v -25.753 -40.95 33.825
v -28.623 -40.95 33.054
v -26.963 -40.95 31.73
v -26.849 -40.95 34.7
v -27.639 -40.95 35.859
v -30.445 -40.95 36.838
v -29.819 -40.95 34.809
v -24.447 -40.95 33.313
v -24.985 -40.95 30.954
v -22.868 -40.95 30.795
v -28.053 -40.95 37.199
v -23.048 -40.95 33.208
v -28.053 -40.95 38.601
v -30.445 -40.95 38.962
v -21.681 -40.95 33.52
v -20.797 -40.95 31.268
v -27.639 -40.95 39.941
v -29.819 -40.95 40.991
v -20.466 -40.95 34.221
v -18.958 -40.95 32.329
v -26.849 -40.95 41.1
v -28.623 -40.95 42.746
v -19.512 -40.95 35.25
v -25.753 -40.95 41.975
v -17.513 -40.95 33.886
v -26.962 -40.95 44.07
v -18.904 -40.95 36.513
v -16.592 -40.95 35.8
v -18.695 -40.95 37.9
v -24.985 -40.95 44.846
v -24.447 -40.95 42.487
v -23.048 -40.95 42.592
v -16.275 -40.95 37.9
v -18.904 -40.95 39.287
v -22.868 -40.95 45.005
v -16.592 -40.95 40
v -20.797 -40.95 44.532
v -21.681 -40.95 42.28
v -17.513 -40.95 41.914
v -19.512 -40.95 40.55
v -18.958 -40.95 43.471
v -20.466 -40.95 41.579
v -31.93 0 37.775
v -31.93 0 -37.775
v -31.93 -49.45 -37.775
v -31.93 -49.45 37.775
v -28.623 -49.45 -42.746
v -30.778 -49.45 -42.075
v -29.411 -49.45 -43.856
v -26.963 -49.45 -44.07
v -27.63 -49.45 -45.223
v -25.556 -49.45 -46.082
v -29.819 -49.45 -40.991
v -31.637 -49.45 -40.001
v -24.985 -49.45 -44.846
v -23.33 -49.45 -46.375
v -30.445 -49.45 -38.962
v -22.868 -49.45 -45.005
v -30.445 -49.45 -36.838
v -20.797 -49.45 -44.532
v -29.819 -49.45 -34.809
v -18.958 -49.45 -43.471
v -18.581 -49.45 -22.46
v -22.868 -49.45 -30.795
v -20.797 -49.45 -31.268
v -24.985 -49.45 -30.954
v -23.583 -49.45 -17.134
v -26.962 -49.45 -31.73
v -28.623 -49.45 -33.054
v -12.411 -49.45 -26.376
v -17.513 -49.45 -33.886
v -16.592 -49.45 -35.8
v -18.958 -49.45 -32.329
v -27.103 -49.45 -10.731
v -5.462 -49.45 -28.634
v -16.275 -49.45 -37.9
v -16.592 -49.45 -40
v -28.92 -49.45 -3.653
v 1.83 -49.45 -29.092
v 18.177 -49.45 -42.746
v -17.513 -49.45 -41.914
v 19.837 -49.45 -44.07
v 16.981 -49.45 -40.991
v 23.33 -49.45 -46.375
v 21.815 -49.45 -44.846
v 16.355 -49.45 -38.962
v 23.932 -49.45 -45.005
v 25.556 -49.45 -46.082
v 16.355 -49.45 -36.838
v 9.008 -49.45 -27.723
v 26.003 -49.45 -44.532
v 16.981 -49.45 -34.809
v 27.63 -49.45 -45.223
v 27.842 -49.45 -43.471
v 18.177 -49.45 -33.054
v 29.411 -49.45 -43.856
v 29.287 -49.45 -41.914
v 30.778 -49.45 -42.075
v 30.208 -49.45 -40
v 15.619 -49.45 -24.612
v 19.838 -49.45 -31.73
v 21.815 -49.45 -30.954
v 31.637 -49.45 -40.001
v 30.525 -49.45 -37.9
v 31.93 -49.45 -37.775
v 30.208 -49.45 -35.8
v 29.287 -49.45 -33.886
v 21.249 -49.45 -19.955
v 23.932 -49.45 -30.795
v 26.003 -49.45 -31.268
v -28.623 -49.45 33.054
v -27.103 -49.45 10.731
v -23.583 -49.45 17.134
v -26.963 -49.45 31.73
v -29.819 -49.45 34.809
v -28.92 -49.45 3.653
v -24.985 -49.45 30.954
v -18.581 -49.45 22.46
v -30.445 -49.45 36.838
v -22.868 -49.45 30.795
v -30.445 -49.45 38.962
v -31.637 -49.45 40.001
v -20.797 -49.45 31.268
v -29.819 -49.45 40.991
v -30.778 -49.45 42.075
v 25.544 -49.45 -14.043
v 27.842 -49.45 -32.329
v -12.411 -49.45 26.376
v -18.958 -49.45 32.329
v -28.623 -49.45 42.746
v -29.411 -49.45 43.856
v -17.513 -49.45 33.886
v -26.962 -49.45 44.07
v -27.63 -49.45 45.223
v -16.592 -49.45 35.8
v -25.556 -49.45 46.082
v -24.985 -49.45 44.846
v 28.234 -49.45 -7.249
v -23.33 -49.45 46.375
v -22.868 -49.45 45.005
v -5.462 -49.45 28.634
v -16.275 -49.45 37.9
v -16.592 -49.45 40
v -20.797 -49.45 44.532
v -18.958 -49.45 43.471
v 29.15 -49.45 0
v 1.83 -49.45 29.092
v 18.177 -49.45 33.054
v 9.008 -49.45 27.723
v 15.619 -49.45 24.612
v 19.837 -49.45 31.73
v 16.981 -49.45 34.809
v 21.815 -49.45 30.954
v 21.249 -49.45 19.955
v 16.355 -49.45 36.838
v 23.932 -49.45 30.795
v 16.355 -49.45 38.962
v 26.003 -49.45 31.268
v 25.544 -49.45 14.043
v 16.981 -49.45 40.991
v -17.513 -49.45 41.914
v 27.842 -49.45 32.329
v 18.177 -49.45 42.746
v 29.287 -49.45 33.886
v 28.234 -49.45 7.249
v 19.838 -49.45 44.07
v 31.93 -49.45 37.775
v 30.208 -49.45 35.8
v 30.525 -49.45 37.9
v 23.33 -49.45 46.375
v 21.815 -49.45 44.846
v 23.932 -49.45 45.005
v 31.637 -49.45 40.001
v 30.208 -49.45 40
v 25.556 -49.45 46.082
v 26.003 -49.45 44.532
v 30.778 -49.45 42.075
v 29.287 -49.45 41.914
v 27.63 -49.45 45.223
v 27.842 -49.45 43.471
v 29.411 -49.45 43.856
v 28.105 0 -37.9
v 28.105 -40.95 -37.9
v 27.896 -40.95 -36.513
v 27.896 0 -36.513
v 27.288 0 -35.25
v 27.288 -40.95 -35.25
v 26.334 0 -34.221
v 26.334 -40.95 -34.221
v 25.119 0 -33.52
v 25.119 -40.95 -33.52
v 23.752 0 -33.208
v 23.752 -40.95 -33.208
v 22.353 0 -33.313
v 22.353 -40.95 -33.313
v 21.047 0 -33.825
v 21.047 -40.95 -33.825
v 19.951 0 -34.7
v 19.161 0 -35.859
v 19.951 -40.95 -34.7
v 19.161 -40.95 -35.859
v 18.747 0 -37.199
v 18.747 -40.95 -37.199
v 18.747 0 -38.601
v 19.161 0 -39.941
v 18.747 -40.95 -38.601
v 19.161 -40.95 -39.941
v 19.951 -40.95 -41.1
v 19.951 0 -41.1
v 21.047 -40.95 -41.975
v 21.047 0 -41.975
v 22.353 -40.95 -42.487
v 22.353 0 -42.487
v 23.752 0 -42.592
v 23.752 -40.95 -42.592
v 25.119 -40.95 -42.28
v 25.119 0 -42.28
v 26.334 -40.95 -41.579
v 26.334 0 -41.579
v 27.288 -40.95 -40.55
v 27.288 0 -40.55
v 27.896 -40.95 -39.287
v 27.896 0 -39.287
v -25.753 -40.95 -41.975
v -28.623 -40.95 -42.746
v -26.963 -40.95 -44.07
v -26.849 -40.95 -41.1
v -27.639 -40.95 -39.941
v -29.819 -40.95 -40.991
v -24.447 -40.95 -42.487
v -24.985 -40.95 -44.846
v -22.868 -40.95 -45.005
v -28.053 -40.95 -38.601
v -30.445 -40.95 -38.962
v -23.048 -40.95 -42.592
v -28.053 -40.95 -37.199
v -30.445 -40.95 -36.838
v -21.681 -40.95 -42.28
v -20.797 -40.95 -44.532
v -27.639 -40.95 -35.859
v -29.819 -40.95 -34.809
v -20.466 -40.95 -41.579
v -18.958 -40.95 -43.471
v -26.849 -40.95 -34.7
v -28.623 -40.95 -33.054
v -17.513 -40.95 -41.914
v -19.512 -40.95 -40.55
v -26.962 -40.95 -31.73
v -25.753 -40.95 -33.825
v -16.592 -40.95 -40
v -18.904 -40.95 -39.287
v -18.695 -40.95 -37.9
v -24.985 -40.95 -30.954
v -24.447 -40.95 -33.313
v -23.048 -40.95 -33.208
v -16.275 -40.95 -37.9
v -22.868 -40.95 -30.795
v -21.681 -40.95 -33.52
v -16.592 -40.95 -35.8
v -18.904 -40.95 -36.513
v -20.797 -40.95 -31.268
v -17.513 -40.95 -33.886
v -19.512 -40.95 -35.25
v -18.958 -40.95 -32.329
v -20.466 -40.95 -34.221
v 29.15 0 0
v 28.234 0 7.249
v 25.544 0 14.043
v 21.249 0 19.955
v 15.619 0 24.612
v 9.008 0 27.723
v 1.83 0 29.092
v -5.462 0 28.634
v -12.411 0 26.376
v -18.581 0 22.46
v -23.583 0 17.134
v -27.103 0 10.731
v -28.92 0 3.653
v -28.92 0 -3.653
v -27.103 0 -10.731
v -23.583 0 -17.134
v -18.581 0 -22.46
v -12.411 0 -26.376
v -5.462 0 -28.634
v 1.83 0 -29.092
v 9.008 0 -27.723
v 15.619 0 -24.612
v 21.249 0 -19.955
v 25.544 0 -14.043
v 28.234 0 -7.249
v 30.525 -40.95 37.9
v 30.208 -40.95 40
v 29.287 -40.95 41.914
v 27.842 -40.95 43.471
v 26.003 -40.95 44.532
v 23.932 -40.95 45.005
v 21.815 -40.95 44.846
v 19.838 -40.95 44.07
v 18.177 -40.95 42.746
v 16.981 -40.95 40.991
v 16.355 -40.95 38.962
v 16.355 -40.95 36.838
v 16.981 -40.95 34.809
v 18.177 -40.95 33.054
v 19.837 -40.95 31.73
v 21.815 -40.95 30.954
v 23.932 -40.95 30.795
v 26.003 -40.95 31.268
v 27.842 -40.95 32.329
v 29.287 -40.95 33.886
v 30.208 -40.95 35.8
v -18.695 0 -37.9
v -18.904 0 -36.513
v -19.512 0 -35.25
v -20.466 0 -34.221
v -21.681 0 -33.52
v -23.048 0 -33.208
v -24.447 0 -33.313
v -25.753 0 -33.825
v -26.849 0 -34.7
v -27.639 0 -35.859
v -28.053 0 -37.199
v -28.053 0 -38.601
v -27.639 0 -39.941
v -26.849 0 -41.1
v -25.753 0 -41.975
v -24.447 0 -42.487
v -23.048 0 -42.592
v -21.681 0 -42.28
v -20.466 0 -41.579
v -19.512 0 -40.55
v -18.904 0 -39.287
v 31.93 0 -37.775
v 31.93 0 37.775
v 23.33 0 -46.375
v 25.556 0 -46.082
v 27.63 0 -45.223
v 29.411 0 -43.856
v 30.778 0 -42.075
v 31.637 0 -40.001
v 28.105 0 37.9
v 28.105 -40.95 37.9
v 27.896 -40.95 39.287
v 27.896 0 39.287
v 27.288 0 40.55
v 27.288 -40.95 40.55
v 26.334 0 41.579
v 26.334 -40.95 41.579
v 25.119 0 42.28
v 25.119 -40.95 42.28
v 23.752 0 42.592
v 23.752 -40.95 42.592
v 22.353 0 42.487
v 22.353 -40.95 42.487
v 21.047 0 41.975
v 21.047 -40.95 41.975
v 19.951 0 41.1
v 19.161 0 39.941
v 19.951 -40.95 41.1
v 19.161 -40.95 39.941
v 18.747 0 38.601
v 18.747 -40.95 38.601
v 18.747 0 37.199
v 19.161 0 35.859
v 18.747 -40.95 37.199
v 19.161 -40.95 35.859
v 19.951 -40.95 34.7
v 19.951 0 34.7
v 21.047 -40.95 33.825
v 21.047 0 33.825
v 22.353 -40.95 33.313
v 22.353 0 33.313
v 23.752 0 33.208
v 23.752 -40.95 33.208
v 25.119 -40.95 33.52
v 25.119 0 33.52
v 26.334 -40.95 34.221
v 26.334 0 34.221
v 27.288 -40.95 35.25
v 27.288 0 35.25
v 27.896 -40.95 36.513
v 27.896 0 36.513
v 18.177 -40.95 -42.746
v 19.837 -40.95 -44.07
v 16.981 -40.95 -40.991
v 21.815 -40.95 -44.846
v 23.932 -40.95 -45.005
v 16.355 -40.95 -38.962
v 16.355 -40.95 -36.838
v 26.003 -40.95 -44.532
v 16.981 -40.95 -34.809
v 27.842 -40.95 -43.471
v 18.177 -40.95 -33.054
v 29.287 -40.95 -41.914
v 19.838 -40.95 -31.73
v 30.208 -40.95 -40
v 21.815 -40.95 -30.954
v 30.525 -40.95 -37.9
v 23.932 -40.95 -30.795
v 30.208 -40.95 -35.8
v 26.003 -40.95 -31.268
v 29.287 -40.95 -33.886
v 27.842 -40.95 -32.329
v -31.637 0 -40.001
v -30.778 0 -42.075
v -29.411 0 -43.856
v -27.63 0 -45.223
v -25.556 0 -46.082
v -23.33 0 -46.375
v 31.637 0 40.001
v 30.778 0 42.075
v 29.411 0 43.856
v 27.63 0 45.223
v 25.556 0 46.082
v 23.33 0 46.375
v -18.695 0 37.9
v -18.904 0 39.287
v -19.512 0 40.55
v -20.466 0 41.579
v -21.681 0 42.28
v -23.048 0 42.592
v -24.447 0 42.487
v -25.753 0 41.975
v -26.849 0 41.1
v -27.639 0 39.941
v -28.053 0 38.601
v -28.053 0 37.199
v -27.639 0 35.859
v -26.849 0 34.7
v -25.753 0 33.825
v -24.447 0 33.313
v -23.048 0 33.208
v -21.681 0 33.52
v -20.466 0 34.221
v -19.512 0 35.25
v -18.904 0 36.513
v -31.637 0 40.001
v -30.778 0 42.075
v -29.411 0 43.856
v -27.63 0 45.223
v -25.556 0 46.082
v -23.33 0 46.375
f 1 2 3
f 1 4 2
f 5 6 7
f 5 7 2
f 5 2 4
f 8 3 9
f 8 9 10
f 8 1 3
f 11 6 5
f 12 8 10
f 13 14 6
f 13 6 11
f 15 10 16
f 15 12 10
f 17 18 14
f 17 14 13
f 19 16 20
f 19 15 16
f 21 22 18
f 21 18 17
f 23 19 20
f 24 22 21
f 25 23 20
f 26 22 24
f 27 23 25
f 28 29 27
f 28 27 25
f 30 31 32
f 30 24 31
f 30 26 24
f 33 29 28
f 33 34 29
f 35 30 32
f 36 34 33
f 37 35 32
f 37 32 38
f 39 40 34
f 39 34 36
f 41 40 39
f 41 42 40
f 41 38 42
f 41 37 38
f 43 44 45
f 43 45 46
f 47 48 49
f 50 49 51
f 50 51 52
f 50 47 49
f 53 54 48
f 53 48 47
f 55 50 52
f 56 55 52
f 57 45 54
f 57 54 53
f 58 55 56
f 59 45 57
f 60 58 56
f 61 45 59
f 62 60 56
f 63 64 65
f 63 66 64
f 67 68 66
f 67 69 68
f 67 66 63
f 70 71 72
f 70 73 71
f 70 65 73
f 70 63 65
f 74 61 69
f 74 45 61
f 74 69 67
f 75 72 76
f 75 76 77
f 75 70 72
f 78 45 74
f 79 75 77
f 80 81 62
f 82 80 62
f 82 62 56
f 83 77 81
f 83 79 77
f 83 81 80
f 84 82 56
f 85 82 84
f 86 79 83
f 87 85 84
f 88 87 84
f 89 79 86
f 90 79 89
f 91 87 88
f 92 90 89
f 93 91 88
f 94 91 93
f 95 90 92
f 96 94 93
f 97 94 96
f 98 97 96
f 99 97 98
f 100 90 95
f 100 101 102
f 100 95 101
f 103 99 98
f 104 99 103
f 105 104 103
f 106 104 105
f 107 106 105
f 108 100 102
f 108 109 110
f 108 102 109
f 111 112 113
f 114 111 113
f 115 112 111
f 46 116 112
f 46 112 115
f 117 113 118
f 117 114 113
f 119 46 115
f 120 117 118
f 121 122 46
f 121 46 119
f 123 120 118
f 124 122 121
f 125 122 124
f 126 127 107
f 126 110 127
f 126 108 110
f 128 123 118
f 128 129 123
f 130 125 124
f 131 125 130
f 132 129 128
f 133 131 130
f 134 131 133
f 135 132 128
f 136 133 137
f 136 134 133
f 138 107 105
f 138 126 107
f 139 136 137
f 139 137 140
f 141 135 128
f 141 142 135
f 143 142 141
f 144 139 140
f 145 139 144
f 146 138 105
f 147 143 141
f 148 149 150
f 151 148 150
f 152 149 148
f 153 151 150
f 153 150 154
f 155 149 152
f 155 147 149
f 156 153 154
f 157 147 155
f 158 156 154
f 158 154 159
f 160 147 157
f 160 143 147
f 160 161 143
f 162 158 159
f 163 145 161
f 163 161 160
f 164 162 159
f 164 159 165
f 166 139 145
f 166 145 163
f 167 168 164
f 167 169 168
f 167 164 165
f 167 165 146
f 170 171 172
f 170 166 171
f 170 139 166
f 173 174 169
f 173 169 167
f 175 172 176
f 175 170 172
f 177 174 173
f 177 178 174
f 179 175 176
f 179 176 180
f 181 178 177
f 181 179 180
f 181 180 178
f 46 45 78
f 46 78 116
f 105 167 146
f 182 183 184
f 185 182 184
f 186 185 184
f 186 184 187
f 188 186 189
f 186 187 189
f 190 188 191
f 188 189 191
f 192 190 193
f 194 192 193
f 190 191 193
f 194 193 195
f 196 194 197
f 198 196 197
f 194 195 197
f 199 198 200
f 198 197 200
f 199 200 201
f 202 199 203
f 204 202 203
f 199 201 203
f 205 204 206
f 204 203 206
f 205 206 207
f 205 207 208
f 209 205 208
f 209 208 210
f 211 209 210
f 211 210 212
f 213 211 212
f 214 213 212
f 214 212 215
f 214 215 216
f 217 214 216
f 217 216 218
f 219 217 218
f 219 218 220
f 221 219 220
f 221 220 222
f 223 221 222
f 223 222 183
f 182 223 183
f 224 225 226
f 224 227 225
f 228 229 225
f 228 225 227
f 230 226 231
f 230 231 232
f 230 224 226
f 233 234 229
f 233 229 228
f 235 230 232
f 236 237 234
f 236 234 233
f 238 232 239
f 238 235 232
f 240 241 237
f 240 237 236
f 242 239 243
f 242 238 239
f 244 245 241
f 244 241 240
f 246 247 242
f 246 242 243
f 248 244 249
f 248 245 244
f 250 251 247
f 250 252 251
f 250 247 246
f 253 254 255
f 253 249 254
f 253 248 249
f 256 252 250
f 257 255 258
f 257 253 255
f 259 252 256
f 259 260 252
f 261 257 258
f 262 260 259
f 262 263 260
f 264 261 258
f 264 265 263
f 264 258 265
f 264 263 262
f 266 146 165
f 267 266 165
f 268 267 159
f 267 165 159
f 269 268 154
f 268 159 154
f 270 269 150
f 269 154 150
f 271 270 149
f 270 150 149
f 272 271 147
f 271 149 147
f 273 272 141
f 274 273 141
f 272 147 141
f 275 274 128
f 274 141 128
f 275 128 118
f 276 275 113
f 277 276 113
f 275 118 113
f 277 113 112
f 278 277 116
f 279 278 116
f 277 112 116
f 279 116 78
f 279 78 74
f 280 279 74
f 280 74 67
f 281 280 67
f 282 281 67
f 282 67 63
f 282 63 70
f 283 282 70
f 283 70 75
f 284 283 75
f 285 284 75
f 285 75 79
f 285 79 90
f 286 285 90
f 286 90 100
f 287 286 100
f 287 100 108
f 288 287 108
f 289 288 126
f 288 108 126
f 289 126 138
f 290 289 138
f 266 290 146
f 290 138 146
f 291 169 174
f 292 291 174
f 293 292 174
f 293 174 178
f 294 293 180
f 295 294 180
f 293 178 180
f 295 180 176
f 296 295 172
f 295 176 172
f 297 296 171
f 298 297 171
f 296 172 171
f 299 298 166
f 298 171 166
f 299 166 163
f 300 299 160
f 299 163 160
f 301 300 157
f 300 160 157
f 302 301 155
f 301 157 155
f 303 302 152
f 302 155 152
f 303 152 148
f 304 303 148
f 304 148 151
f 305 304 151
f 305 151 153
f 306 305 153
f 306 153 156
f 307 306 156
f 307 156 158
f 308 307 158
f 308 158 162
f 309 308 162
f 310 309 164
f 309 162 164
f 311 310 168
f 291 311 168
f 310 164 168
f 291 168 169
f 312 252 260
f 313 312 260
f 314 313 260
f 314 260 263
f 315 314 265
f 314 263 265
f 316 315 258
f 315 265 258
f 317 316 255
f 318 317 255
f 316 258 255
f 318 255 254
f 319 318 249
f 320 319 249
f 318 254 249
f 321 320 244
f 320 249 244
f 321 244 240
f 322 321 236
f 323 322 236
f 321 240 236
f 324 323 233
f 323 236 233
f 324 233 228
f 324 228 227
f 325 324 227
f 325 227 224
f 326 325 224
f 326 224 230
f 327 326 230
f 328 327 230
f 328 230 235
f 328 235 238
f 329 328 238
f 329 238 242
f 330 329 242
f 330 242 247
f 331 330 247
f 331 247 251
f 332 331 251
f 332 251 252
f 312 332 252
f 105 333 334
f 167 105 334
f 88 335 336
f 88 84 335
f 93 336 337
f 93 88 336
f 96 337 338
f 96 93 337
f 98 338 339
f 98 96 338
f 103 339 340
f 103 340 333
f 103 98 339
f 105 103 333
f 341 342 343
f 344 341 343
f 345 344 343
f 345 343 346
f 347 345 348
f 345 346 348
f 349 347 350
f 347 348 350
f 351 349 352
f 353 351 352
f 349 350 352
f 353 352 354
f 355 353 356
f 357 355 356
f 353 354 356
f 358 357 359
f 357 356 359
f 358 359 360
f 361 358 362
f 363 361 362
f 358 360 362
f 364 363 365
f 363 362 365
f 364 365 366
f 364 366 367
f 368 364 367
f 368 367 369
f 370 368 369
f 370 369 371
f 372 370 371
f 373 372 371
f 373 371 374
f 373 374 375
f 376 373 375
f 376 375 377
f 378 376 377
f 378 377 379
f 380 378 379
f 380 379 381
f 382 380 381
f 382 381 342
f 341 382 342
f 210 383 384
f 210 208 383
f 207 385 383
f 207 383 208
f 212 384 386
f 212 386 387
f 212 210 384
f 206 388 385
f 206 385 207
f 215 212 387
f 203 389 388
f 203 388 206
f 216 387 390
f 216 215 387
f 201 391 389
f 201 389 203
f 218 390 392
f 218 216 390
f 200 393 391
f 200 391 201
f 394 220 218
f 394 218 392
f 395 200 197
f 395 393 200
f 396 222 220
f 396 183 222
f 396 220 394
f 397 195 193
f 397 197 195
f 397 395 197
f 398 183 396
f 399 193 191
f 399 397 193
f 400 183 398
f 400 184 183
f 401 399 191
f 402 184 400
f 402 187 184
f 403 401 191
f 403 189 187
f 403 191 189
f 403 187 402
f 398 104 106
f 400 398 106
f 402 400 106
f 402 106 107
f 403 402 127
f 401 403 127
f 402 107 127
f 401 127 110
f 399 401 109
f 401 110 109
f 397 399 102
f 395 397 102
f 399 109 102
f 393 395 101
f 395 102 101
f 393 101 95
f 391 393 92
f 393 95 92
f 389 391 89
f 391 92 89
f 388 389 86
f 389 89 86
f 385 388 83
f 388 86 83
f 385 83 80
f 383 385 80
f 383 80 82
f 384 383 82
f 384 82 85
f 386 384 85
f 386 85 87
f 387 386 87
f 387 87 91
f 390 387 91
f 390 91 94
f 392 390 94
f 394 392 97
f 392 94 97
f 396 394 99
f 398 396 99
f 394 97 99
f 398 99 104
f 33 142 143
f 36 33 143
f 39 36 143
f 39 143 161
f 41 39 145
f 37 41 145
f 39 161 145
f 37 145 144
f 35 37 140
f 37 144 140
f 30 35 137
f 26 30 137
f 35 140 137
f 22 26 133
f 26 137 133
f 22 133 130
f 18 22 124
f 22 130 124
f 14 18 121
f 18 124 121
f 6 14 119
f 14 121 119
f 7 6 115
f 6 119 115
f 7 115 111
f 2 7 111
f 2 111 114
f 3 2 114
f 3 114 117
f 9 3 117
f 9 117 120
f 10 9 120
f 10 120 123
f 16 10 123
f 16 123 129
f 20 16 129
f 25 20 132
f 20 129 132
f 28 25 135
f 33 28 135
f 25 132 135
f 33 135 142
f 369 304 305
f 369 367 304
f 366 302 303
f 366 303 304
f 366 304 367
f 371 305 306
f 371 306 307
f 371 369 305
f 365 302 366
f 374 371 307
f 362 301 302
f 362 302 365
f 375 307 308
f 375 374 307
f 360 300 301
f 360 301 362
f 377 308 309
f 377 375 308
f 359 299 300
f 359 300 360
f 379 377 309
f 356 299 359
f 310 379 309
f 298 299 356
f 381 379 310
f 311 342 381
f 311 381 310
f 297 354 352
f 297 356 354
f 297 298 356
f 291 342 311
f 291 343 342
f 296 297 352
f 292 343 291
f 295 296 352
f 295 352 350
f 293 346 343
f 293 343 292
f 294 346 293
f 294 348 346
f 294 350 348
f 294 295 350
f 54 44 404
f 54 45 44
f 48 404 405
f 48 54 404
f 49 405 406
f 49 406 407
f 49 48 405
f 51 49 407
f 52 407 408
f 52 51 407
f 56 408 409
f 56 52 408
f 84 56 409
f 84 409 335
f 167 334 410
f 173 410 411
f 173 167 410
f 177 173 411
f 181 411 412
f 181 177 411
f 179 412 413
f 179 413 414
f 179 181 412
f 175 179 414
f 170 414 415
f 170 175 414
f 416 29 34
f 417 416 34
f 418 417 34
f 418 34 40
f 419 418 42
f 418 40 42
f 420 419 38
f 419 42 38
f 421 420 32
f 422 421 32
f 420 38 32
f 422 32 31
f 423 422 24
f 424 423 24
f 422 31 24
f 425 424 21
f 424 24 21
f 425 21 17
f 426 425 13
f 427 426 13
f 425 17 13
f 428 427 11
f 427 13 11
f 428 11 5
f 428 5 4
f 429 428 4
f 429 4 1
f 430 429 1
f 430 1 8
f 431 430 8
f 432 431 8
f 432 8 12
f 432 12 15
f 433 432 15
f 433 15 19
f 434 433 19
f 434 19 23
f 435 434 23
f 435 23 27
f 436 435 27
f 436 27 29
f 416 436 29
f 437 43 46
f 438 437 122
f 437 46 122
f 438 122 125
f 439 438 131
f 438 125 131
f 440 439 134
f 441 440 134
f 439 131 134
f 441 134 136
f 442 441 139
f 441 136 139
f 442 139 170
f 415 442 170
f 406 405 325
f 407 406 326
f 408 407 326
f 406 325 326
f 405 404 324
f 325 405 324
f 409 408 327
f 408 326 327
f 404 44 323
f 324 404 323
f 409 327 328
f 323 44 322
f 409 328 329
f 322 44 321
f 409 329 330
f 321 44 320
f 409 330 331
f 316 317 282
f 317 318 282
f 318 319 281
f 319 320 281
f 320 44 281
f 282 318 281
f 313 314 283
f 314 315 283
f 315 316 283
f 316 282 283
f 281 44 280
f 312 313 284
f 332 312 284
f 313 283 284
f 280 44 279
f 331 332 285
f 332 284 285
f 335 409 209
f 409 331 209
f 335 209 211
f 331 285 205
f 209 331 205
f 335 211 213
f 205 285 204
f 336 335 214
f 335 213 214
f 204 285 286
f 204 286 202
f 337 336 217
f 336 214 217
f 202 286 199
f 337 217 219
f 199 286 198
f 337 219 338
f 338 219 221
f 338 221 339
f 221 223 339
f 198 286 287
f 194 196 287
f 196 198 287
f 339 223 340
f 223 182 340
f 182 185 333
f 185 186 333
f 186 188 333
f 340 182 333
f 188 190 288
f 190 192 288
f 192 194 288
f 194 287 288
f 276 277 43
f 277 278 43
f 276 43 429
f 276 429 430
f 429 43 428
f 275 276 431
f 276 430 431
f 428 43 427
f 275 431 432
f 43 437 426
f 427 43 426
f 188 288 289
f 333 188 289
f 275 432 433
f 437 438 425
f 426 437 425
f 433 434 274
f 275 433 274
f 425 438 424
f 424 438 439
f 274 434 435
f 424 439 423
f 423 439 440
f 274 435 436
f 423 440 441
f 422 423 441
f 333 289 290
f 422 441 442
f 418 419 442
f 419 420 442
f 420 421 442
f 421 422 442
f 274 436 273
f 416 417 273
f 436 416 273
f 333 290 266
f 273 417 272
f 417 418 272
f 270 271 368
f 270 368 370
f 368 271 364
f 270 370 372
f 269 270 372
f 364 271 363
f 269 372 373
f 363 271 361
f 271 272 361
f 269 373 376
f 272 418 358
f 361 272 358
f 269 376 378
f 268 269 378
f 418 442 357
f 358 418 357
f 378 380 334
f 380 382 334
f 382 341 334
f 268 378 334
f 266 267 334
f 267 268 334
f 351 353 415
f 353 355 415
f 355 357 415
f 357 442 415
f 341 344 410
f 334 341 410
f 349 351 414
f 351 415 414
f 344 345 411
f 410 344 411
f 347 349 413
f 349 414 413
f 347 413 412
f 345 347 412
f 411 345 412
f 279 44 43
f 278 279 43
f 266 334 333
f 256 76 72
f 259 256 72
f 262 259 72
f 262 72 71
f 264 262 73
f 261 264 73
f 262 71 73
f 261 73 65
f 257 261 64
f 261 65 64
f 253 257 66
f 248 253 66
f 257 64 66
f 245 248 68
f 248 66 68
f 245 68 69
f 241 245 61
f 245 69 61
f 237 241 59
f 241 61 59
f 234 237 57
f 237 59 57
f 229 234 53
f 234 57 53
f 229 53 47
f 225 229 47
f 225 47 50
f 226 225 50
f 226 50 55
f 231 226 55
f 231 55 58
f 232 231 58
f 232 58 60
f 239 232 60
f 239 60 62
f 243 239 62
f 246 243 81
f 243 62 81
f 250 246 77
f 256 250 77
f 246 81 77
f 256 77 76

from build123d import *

# Parameters (mm, degrees)
F0_W     = 63.86
F0_H     = 92.75
F1_DEPTH = 49.45
F2_R     = 8.6
F3_R     = 4.705062
F4_DEPTH = 54.1
F5_R     = 7.125
F6_DEPTH = 8.5
F7_R     = 29.15
F8_DEPTH = 69.1


with BuildPart() as f1:
    # F0 (on Front) → F1 (new body)
    with BuildSketch(Plane.XZ):
        Rectangle(F0_W, F0_H)
    extrude(amount=F1_DEPTH)

    # F2
    f2_edges = [f1.edges().sort_by_distance(p)[0] for p in [
        (31.93, -24.725, 46.375),
        (-31.93, -24.725, 46.375),
        (-31.93, -24.725, -46.375),
        (31.93, -24.725, -46.375),
    ]]
    fillet(f2_edges, radius=F2_R)

    # F3 (on face) → F4 (cut)
    with BuildSketch(Plane.XZ.offset(49.45)):
        with Locations((-23.4, 37.9)):
            Circle(F3_R)
        with Locations((23.4, 37.9)):
            Circle(F3_R)
        with Locations((-23.4, -37.9)):
            Circle(F3_R)
        with Locations((23.4, -37.9)):
            Circle(F3_R)
    extrude(amount=-F4_DEPTH, mode=Mode.SUBTRACT)

    # F5 (on face) → F6 (cut)
    with BuildSketch(Plane.XZ.offset(49.45)):
        with Locations((-23.4, 37.9)):
            Circle(F5_R)
        with Locations((23.4, 37.9)):
            Circle(F5_R)
        with Locations((-23.4, -37.9)):
            Circle(F5_R)
        with Locations((23.4, -37.9)):
            Circle(F5_R)
    extrude(amount=-F6_DEPTH, mode=Mode.SUBTRACT)

    # F7 (on face) → F8 (cut)
    with BuildSketch(Plane.XZ.offset(49.45)):
        Circle(F7_R)
    extrude(amount=-F8_DEPTH, mode=Mode.SUBTRACT)


solid = f1.part
